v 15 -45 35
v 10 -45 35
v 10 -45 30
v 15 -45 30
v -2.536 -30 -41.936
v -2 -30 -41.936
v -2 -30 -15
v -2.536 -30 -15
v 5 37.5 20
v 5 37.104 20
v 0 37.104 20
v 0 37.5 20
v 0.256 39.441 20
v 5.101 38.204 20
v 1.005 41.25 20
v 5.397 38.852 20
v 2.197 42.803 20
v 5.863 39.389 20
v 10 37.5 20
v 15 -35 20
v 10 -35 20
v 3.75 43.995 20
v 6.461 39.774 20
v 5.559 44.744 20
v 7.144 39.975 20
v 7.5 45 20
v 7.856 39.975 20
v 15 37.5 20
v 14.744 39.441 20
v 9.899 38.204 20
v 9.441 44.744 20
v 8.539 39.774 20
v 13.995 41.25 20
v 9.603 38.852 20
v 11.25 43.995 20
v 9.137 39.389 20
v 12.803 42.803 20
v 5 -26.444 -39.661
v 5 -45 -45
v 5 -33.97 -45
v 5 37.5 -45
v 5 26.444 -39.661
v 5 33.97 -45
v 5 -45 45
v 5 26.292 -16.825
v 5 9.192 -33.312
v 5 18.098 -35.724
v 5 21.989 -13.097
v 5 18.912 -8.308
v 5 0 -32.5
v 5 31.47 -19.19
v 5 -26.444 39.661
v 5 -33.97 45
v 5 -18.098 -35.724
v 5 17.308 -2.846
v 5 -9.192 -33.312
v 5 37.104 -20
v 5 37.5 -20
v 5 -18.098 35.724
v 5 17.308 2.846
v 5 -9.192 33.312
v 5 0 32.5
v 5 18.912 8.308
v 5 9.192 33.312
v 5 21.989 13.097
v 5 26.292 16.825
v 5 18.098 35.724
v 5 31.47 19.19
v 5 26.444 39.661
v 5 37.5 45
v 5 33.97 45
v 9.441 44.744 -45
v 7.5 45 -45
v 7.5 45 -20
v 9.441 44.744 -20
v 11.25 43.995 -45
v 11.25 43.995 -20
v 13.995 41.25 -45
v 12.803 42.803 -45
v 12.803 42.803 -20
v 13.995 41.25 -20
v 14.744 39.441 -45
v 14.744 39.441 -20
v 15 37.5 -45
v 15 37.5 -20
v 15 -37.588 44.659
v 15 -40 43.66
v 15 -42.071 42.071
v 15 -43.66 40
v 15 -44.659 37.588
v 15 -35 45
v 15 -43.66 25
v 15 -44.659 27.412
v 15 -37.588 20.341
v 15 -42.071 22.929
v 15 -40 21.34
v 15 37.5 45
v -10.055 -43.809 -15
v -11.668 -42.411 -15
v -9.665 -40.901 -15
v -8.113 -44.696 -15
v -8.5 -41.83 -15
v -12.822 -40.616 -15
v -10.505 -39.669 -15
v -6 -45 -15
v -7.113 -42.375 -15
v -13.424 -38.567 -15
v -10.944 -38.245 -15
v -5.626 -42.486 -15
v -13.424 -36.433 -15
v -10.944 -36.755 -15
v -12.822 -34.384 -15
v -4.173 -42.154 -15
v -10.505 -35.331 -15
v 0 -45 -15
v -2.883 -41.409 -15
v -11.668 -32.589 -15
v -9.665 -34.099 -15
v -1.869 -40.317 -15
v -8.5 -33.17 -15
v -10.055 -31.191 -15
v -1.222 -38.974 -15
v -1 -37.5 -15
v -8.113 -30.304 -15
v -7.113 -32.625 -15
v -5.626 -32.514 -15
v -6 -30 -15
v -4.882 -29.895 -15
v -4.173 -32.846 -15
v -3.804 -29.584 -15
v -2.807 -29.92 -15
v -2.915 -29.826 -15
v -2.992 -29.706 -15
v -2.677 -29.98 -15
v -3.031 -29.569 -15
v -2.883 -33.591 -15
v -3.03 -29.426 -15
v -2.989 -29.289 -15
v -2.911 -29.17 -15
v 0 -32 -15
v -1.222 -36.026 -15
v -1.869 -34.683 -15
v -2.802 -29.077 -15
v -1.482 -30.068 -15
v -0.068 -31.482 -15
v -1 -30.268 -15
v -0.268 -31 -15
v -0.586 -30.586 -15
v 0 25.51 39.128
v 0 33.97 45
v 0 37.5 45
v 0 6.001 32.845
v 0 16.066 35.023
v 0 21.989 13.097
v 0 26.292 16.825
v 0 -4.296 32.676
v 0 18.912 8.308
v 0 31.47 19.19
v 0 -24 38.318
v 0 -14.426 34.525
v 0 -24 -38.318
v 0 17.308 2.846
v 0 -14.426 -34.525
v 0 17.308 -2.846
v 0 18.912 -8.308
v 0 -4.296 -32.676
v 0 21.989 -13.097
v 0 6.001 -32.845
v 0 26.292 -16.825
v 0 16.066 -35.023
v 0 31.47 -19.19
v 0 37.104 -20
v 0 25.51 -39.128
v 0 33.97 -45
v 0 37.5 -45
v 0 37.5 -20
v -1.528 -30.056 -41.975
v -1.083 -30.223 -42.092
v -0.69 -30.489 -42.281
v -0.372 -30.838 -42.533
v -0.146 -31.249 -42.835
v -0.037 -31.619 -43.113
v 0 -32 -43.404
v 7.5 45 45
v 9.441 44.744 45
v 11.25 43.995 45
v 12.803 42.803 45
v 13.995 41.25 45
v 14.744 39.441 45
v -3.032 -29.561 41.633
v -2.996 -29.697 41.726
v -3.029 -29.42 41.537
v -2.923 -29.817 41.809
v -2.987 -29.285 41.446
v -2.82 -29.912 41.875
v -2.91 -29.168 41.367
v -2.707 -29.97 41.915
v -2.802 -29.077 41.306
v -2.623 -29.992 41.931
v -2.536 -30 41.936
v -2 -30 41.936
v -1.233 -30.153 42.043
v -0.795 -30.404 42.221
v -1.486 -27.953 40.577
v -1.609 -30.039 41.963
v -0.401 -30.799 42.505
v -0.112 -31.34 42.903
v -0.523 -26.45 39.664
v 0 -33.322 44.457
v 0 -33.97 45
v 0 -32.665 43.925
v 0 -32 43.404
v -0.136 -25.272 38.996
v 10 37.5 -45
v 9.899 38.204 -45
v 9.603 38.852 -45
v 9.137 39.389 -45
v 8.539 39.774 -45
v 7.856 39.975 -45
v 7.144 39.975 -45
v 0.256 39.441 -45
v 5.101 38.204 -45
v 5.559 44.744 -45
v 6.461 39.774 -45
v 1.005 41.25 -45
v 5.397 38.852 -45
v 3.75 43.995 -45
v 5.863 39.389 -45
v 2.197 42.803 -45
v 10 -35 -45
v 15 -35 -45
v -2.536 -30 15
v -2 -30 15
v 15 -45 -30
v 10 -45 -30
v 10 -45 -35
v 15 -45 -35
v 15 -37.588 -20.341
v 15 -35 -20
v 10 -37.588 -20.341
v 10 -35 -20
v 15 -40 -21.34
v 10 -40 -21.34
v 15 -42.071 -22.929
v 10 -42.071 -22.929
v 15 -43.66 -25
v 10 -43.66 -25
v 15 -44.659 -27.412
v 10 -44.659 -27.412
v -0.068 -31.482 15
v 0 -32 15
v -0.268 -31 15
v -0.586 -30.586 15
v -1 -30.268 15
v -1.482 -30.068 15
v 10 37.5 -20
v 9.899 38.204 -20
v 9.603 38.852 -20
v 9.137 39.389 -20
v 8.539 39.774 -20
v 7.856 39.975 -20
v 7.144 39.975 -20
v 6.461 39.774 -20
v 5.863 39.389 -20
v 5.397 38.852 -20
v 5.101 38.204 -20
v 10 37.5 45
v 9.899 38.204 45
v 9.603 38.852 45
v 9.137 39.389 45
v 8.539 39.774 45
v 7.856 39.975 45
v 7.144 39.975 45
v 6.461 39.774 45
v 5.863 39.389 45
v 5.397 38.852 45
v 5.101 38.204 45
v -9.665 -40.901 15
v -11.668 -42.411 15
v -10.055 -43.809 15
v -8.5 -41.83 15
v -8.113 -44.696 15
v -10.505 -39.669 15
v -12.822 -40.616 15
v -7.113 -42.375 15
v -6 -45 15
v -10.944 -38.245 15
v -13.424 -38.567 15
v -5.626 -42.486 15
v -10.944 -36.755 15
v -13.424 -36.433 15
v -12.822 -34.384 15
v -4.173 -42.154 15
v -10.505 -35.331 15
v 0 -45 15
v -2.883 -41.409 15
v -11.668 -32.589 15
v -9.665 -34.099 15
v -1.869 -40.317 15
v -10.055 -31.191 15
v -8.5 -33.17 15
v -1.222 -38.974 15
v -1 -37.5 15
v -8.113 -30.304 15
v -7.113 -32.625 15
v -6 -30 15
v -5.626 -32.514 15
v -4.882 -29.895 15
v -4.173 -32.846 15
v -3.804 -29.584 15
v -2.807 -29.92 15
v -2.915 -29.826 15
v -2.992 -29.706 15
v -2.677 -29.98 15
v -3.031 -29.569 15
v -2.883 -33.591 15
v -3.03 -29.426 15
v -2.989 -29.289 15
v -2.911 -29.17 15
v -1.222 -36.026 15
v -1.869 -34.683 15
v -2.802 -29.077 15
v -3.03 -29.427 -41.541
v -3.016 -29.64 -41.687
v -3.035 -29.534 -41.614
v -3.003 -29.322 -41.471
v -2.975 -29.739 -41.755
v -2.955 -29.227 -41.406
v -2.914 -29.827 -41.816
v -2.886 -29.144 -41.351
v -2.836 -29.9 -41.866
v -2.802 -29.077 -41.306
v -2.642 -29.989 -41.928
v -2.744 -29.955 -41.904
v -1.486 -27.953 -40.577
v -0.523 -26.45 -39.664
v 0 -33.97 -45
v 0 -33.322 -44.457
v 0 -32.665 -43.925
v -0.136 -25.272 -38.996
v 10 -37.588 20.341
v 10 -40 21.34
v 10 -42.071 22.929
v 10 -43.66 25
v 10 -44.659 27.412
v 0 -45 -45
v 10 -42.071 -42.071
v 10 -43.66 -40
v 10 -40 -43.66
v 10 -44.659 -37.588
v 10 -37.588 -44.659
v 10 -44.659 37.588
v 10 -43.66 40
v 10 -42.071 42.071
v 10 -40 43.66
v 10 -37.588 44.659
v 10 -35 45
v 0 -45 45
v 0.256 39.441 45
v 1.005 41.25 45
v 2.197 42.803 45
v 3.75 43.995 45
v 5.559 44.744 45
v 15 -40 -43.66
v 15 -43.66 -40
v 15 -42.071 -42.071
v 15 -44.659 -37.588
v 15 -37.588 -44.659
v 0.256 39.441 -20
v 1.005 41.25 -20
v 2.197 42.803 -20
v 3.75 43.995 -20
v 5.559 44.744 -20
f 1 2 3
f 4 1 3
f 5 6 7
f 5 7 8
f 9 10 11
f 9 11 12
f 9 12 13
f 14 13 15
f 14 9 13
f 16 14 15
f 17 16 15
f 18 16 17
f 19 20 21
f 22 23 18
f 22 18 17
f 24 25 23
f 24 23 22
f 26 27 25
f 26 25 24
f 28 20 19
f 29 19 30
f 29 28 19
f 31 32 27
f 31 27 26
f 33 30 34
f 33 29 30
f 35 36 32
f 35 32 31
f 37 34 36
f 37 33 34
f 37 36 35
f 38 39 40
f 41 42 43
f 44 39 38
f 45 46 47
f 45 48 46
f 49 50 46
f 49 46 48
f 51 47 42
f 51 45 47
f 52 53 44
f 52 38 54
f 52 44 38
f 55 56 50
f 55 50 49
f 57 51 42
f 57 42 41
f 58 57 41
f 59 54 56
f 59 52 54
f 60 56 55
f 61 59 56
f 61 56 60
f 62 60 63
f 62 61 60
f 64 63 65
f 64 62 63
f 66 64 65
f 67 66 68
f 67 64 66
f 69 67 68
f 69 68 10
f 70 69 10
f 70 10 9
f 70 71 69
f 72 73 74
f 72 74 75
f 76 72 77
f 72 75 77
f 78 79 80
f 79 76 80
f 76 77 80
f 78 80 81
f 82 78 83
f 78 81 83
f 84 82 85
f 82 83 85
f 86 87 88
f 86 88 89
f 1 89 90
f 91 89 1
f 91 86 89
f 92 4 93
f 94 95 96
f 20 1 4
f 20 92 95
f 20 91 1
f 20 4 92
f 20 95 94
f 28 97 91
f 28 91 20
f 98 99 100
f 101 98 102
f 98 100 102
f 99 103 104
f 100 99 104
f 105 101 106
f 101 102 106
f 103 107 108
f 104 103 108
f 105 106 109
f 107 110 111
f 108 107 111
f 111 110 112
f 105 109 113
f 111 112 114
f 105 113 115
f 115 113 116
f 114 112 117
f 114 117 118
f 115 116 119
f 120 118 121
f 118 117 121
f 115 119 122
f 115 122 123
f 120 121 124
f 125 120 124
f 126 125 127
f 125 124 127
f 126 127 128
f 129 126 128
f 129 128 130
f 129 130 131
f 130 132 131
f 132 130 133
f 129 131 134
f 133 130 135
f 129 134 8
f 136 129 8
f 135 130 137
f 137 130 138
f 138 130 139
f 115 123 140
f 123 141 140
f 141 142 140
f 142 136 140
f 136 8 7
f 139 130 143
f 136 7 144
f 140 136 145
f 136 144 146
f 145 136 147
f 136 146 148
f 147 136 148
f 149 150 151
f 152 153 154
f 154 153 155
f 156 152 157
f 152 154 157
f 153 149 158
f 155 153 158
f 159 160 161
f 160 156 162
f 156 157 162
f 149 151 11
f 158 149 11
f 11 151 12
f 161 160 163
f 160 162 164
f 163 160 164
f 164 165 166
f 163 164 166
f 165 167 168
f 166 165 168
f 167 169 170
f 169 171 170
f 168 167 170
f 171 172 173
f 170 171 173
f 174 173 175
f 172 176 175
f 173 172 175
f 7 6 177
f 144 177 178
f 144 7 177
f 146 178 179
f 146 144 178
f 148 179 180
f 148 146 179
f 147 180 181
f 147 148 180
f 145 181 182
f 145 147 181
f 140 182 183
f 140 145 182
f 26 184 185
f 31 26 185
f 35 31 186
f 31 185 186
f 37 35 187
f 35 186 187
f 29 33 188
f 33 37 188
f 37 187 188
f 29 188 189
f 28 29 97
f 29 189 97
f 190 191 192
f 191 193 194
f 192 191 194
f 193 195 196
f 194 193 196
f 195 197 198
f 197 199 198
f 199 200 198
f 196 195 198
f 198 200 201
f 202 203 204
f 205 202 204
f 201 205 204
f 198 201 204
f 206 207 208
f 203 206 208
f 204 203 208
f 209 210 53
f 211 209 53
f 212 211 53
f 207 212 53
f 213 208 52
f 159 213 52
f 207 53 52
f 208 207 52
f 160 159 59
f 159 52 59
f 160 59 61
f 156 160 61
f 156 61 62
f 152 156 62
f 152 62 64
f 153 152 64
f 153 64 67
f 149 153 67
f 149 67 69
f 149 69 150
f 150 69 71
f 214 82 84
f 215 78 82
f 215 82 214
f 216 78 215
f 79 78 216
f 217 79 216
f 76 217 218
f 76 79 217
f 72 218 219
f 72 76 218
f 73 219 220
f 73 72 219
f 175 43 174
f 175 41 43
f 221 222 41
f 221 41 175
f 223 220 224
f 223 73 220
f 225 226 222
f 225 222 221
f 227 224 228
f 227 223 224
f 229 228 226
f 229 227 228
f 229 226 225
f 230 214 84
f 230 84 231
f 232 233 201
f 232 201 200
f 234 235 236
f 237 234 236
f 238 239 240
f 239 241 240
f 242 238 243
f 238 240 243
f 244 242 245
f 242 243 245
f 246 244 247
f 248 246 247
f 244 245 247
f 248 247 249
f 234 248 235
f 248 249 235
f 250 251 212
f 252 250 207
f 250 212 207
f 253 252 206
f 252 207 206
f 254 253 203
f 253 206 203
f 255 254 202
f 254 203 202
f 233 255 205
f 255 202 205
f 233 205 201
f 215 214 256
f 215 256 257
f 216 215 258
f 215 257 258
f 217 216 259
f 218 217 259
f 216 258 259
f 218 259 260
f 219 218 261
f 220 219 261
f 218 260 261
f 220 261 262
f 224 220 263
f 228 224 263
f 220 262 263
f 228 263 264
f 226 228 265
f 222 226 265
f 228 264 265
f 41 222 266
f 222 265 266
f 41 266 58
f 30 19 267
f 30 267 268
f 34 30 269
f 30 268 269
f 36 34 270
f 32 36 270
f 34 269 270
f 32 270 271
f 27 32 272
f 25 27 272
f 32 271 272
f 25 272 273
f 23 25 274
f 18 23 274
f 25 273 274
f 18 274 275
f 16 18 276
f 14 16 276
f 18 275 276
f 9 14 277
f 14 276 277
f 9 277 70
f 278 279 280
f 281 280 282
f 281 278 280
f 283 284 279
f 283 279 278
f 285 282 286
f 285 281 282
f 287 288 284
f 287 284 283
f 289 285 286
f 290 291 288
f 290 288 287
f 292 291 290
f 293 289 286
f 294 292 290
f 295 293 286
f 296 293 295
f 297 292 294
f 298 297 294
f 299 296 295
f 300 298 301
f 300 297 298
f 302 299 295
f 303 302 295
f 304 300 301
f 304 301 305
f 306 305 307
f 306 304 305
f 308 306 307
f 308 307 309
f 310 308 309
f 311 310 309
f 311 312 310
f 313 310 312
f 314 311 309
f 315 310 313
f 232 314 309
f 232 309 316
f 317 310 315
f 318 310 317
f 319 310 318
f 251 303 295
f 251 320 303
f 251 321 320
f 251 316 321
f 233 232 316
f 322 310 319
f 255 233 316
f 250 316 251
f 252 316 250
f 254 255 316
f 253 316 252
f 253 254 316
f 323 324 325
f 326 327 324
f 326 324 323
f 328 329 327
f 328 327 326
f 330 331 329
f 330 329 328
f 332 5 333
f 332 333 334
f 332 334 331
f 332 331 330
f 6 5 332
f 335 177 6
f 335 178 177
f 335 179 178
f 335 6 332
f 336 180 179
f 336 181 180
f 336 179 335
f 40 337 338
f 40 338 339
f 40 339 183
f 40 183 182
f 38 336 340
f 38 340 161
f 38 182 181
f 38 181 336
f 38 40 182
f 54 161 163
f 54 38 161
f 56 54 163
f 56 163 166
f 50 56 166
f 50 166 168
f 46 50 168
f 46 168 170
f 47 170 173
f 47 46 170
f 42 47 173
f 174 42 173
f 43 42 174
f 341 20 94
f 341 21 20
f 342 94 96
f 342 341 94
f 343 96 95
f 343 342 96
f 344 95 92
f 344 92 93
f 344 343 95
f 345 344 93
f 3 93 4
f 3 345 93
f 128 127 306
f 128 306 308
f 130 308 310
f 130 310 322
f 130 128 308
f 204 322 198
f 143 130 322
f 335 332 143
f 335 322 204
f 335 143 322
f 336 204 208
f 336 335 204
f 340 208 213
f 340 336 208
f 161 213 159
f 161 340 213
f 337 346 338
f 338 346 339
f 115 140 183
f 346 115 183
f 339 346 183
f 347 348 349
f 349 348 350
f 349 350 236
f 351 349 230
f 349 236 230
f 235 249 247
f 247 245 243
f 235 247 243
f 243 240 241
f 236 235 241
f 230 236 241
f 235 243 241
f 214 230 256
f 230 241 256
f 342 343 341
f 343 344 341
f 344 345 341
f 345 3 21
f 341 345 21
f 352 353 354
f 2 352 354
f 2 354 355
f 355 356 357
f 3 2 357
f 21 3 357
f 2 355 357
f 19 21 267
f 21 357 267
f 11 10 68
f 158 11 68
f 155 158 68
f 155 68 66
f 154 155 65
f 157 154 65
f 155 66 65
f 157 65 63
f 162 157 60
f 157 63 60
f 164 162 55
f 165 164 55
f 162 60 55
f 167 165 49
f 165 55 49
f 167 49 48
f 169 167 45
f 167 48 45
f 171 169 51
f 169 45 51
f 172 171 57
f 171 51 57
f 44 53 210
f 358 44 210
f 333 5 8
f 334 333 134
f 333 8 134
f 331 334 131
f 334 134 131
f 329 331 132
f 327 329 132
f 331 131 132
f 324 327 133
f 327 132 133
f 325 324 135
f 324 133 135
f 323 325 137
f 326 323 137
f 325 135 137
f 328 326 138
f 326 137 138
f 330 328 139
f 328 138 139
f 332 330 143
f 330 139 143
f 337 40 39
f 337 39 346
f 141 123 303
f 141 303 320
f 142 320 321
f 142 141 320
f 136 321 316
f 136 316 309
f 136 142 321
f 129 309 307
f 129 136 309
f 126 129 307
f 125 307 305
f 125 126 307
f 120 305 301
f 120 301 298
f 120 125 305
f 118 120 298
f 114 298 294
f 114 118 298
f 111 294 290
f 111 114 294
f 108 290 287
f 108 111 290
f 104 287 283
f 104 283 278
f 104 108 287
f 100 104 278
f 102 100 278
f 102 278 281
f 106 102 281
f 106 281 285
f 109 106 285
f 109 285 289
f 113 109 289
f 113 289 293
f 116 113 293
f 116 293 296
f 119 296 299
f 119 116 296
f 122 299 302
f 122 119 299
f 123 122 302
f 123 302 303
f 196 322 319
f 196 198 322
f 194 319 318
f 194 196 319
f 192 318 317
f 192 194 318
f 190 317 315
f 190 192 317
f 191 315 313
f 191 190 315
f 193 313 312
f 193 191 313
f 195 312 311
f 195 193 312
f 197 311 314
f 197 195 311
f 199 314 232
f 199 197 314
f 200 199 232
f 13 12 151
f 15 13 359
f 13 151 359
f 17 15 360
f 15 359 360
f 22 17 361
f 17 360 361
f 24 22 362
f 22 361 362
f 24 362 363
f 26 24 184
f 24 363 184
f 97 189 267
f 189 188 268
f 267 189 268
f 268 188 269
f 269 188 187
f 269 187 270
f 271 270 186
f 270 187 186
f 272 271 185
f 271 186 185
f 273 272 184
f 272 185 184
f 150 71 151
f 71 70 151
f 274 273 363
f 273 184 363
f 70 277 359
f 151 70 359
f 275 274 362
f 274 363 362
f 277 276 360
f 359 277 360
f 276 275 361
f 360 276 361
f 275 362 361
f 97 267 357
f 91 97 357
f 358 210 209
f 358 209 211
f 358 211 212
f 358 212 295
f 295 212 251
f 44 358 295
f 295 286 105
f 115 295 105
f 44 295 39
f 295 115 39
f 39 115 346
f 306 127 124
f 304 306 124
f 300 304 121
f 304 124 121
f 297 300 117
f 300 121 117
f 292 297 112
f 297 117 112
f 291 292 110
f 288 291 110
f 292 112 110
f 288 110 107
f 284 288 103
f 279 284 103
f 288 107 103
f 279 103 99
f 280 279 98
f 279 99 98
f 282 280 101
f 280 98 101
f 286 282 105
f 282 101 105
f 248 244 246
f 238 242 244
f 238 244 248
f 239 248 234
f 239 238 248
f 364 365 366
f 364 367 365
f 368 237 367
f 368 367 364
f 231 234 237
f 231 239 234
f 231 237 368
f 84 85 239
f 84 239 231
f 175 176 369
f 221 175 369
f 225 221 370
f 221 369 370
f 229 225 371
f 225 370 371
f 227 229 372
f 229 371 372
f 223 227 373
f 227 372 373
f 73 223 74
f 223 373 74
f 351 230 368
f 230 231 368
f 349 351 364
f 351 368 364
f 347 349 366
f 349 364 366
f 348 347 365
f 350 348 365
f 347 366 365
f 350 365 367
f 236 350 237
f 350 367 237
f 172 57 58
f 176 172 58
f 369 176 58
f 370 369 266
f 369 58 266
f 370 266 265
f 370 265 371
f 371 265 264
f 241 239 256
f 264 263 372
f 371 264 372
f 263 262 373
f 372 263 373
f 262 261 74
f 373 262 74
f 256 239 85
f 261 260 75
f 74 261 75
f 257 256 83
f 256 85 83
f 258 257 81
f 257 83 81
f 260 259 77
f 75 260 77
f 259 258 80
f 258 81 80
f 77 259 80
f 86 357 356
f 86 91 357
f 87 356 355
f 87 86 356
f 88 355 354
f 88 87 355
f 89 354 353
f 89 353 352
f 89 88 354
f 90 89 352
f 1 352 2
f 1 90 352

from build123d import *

# Parameters (mm, degrees)
SKETCH_1_W                      = 90
SKETCH_1_H                      = 90
EXTRUDE_1_DEPTH                 = 15
SKETCH_2_W                      = 5
SKETCH_2_H                      = 82.5
CUT_EXTRUDE_1_DEPTH             = 102.734949747
CUT_EXTRUDE_2_REACH             = 67.383
SKETCH_3_W                      = 40
SKETCH_3_H                      = 90
FILLET_1_R                      = 10
CUT_EXTRUDE_3_DEPTH             = 65.420493634
EXTRUDE_4_DEPTH                 = 15
EXTRUDE_4_DEPTH_BACK            = 15
SKETCH_7_R                      = 5
EXTRUDE_5_DEPTH                 = 45
EXTRUDE_5_DEPTH_BACK            = 45
CUT_EXTRUDE_4_REACH             = 67.383
CUT_EXTRUDE_4_DIRECTION_2_DEPTH = 15
FILLET_2_R                      = 0.5
FILLET_3_R                      = 2


with BuildPart() as part:
    # 草图1 → 凸台-拉伸1 (new body)
    with BuildSketch(Plane(origin=(0, 0, 0), x_dir=(0, 0, -1), z_dir=(1, 0, 0))):
        Rectangle(SKETCH_1_W, SKETCH_1_H)
    extrude(amount=EXTRUDE_1_DEPTH)

    # 草图2 → 切除-拉伸1 (cut, through all)
    with BuildSketch(Plane.XY.offset(45)):
        with BuildLine():
            Line((0, 45), (0, 37.5))
            ThreePointArc((0, 37.5), (2.196699141, 42.803300859), (7.5, 45))
            Line((7.5, 45), (0, 45))
        make_face()
        with BuildLine():
            Line((15, 45), (7.5, 45))
            ThreePointArc((7.5, 45), (12.803300859, 42.803300859), (15, 37.5))
            Line((15, 37.5), (15, 45))
        make_face()
        with BuildLine():
            ThreePointArc((10, 37.5), (7.5, 40), (5, 37.5))
            Line((5, 37.5), (10, 37.5))
        make_face()
        with Locations((7.5, -3.75)):
            Rectangle(SKETCH_2_W, SKETCH_2_H)
    extrude(amount=-CUT_EXTRUDE_1_DEPTH, mode=Mode.SUBTRACT)

    # 切除-拉伸2: up to this face of the body (flat: up to its plane)
    cut_extrude_2_end = Plane(part.part.faces().sort_by_distance((5, -3.75, 0))[0])
    # 草图3 → 切除-拉伸2 (cut, up to the picked face)
    with BuildSketch(Plane(origin=(15, 0, 0), x_dir=(0, 0, -1), z_dir=(1, 0, 0)), mode=Mode.PRIVATE) as cut_extrude_2_sk1:
        Rectangle(SKETCH_3_W, SKETCH_3_H)
    cut_extrude_2_tool1 = split(extrude(cut_extrude_2_sk1.sketch, amount=-CUT_EXTRUDE_2_REACH, mode=Mode.PRIVATE), bisect_by=cut_extrude_2_end, keep=Keep.BOTH, mode=Mode.PRIVATE)
    add(cut_extrude_2_tool1.solids().sort_by(Axis((15, 0, 0), (-1, 0, 0)))[0], mode=Mode.SUBTRACT)

    # 圆角1
    fillet_1_edges = [part.edges().sort_by_distance(p)[0] for p in [
        (12.5, -45, 20),
        (12.5, -45, -20),
        (12.5, -45, -45),
        (12.5, -45, 45),
    ]]
    fillet(fillet_1_edges, radius=FILLET_1_R)

    # 草图4 → 切除-拉伸3 (cut, through all)
    with BuildSketch(Plane(origin=(5, 0, 0), x_dir=(0, 0, -1), z_dir=(1, 0, 0))):
        with BuildLine():
            Line((-20, 44.571067812), (-20, 37.104465858))
            ThreePointArc((-20, 37.104465858), (0, 17.104465858), (20, 37.104465858))
            Line((20, 37.104465858), (20, 44.571067812))
            Line((20, 44.571067812), (-20, 44.571067812))
        make_face()
    extrude(amount=-CUT_EXTRUDE_3_DEPTH, mode=Mode.SUBTRACT)

    # 草图7 → 凸台-拉伸4 (add, two sides: drawn at the far end of the back side and taken through both)
    with BuildSketch(Plane.XY.offset(-EXTRUDE_4_DEPTH_BACK)):
        with BuildLine():
            Line((0, -30), (-6, -30))
            ThreePointArc((-6, -30), (-13.5, -37.5), (-6, -45))
            Line((-6, -45), (0, -45))
            Line((0, -45), (0, -30))
        make_face()
        with Locations((-6, -37.5)):
            Circle(SKETCH_7_R, mode=Mode.SUBTRACT)
    extrude(amount=EXTRUDE_4_DEPTH + EXTRUDE_4_DEPTH_BACK)

    # 草图9 → 凸台-拉伸5 (add, two sides: drawn at the far end of the back side and taken through both)
    with BuildSketch(Plane.XY.offset(-EXTRUDE_5_DEPTH_BACK)):
        with BuildLine():
            Line((0, -24), (0, -30))
            Line((0, -30), (-6, -30))
            ThreePointArc((-6, -30), (-1.757359313, -28.242640687), (0, -24))
        make_face()
    extrude(amount=EXTRUDE_5_DEPTH + EXTRUDE_5_DEPTH_BACK)

    # 切除-拉伸4: up to this face of the body (flat: up to its plane)
    cut_extrude_4_end = Plane(part.part.faces().sort_by_distance((10, -2.920820113, 32.5))[0])
    # 草图6 → 切除-拉伸4 (cut, up to the picked face)
    with BuildSketch(Plane.ZY, mode=Mode.PRIVATE) as cut_extrude_4_sk1:
        with BuildLine():
            Line((45, 33.969795549), (45, -33.969795549))
            ThreePointArc((45, -33.969795549), (32.5, 0), (45, 33.969795549))
        make_face()
    cut_extrude_4_tool1 = split(extrude(cut_extrude_4_sk1.sketch, amount=-CUT_EXTRUDE_4_REACH, mode=Mode.PRIVATE), bisect_by=cut_extrude_4_end, keep=Keep.BOTH, mode=Mode.PRIVATE)
    # 草图6 → 切除-拉伸4 (cut, up to the picked face)
    with BuildSketch(Plane.ZY, mode=Mode.PRIVATE) as cut_extrude_4_sk2:
        with BuildLine():
            Line((-45, 33.969795549), (-45, -33.969795549))
            ThreePointArc((-45, -33.969795549), (-32.5, 0), (-45, 33.969795549))
        make_face()
    cut_extrude_4_tool2 = split(extrude(cut_extrude_4_sk2.sketch, amount=-CUT_EXTRUDE_4_REACH, mode=Mode.PRIVATE), bisect_by=cut_extrude_4_end, keep=Keep.BOTH, mode=Mode.PRIVATE)
    add(cut_extrude_4_tool1.solids().sort_by(Axis((0, 0, 39.945085), (1, 0, 0)))[0], mode=Mode.SUBTRACT)
    add(cut_extrude_4_tool2.solids().sort_by(Axis((0, 0, -39.945085), (1, 0, 0)))[0], mode=Mode.SUBTRACT)

    # 草图6 → 切除-拉伸4 direction 2 (cut)
    with BuildSketch(Plane.ZY):
        with BuildLine():
            Line((45, 33.969795549), (45, -33.969795549))
            ThreePointArc((45, -33.969795549), (32.5, 0), (45, 33.969795549))
        make_face()
        with BuildLine():
            Line((-45, 33.969795549), (-45, -33.969795549))
            ThreePointArc((-45, -33.969795549), (-32.5, 0), (-45, 33.969795549))
        make_face()
    extrude(amount=CUT_EXTRUDE_4_DIRECTION_2_DEPTH, mode=Mode.SUBTRACT)

    # 圆角2
    fillet_2_edges = [part.edges().sort_by_distance(p)[0] for p in [
        (-6, -30, -28.467980088),
        (-6, -30, 28.467980088),
    ]]
    fillet(fillet_2_edges, radius=FILLET_2_R)

    # 圆角3
    fillet_3_edges = [part.edges().sort_by_distance(p)[0] for p in [
        (0, -30, 28.467980088),
        (0, -30, -28.467980088),
    ]]
    fillet(fillet_3_edges, radius=FILLET_3_R)


solid = part.part
